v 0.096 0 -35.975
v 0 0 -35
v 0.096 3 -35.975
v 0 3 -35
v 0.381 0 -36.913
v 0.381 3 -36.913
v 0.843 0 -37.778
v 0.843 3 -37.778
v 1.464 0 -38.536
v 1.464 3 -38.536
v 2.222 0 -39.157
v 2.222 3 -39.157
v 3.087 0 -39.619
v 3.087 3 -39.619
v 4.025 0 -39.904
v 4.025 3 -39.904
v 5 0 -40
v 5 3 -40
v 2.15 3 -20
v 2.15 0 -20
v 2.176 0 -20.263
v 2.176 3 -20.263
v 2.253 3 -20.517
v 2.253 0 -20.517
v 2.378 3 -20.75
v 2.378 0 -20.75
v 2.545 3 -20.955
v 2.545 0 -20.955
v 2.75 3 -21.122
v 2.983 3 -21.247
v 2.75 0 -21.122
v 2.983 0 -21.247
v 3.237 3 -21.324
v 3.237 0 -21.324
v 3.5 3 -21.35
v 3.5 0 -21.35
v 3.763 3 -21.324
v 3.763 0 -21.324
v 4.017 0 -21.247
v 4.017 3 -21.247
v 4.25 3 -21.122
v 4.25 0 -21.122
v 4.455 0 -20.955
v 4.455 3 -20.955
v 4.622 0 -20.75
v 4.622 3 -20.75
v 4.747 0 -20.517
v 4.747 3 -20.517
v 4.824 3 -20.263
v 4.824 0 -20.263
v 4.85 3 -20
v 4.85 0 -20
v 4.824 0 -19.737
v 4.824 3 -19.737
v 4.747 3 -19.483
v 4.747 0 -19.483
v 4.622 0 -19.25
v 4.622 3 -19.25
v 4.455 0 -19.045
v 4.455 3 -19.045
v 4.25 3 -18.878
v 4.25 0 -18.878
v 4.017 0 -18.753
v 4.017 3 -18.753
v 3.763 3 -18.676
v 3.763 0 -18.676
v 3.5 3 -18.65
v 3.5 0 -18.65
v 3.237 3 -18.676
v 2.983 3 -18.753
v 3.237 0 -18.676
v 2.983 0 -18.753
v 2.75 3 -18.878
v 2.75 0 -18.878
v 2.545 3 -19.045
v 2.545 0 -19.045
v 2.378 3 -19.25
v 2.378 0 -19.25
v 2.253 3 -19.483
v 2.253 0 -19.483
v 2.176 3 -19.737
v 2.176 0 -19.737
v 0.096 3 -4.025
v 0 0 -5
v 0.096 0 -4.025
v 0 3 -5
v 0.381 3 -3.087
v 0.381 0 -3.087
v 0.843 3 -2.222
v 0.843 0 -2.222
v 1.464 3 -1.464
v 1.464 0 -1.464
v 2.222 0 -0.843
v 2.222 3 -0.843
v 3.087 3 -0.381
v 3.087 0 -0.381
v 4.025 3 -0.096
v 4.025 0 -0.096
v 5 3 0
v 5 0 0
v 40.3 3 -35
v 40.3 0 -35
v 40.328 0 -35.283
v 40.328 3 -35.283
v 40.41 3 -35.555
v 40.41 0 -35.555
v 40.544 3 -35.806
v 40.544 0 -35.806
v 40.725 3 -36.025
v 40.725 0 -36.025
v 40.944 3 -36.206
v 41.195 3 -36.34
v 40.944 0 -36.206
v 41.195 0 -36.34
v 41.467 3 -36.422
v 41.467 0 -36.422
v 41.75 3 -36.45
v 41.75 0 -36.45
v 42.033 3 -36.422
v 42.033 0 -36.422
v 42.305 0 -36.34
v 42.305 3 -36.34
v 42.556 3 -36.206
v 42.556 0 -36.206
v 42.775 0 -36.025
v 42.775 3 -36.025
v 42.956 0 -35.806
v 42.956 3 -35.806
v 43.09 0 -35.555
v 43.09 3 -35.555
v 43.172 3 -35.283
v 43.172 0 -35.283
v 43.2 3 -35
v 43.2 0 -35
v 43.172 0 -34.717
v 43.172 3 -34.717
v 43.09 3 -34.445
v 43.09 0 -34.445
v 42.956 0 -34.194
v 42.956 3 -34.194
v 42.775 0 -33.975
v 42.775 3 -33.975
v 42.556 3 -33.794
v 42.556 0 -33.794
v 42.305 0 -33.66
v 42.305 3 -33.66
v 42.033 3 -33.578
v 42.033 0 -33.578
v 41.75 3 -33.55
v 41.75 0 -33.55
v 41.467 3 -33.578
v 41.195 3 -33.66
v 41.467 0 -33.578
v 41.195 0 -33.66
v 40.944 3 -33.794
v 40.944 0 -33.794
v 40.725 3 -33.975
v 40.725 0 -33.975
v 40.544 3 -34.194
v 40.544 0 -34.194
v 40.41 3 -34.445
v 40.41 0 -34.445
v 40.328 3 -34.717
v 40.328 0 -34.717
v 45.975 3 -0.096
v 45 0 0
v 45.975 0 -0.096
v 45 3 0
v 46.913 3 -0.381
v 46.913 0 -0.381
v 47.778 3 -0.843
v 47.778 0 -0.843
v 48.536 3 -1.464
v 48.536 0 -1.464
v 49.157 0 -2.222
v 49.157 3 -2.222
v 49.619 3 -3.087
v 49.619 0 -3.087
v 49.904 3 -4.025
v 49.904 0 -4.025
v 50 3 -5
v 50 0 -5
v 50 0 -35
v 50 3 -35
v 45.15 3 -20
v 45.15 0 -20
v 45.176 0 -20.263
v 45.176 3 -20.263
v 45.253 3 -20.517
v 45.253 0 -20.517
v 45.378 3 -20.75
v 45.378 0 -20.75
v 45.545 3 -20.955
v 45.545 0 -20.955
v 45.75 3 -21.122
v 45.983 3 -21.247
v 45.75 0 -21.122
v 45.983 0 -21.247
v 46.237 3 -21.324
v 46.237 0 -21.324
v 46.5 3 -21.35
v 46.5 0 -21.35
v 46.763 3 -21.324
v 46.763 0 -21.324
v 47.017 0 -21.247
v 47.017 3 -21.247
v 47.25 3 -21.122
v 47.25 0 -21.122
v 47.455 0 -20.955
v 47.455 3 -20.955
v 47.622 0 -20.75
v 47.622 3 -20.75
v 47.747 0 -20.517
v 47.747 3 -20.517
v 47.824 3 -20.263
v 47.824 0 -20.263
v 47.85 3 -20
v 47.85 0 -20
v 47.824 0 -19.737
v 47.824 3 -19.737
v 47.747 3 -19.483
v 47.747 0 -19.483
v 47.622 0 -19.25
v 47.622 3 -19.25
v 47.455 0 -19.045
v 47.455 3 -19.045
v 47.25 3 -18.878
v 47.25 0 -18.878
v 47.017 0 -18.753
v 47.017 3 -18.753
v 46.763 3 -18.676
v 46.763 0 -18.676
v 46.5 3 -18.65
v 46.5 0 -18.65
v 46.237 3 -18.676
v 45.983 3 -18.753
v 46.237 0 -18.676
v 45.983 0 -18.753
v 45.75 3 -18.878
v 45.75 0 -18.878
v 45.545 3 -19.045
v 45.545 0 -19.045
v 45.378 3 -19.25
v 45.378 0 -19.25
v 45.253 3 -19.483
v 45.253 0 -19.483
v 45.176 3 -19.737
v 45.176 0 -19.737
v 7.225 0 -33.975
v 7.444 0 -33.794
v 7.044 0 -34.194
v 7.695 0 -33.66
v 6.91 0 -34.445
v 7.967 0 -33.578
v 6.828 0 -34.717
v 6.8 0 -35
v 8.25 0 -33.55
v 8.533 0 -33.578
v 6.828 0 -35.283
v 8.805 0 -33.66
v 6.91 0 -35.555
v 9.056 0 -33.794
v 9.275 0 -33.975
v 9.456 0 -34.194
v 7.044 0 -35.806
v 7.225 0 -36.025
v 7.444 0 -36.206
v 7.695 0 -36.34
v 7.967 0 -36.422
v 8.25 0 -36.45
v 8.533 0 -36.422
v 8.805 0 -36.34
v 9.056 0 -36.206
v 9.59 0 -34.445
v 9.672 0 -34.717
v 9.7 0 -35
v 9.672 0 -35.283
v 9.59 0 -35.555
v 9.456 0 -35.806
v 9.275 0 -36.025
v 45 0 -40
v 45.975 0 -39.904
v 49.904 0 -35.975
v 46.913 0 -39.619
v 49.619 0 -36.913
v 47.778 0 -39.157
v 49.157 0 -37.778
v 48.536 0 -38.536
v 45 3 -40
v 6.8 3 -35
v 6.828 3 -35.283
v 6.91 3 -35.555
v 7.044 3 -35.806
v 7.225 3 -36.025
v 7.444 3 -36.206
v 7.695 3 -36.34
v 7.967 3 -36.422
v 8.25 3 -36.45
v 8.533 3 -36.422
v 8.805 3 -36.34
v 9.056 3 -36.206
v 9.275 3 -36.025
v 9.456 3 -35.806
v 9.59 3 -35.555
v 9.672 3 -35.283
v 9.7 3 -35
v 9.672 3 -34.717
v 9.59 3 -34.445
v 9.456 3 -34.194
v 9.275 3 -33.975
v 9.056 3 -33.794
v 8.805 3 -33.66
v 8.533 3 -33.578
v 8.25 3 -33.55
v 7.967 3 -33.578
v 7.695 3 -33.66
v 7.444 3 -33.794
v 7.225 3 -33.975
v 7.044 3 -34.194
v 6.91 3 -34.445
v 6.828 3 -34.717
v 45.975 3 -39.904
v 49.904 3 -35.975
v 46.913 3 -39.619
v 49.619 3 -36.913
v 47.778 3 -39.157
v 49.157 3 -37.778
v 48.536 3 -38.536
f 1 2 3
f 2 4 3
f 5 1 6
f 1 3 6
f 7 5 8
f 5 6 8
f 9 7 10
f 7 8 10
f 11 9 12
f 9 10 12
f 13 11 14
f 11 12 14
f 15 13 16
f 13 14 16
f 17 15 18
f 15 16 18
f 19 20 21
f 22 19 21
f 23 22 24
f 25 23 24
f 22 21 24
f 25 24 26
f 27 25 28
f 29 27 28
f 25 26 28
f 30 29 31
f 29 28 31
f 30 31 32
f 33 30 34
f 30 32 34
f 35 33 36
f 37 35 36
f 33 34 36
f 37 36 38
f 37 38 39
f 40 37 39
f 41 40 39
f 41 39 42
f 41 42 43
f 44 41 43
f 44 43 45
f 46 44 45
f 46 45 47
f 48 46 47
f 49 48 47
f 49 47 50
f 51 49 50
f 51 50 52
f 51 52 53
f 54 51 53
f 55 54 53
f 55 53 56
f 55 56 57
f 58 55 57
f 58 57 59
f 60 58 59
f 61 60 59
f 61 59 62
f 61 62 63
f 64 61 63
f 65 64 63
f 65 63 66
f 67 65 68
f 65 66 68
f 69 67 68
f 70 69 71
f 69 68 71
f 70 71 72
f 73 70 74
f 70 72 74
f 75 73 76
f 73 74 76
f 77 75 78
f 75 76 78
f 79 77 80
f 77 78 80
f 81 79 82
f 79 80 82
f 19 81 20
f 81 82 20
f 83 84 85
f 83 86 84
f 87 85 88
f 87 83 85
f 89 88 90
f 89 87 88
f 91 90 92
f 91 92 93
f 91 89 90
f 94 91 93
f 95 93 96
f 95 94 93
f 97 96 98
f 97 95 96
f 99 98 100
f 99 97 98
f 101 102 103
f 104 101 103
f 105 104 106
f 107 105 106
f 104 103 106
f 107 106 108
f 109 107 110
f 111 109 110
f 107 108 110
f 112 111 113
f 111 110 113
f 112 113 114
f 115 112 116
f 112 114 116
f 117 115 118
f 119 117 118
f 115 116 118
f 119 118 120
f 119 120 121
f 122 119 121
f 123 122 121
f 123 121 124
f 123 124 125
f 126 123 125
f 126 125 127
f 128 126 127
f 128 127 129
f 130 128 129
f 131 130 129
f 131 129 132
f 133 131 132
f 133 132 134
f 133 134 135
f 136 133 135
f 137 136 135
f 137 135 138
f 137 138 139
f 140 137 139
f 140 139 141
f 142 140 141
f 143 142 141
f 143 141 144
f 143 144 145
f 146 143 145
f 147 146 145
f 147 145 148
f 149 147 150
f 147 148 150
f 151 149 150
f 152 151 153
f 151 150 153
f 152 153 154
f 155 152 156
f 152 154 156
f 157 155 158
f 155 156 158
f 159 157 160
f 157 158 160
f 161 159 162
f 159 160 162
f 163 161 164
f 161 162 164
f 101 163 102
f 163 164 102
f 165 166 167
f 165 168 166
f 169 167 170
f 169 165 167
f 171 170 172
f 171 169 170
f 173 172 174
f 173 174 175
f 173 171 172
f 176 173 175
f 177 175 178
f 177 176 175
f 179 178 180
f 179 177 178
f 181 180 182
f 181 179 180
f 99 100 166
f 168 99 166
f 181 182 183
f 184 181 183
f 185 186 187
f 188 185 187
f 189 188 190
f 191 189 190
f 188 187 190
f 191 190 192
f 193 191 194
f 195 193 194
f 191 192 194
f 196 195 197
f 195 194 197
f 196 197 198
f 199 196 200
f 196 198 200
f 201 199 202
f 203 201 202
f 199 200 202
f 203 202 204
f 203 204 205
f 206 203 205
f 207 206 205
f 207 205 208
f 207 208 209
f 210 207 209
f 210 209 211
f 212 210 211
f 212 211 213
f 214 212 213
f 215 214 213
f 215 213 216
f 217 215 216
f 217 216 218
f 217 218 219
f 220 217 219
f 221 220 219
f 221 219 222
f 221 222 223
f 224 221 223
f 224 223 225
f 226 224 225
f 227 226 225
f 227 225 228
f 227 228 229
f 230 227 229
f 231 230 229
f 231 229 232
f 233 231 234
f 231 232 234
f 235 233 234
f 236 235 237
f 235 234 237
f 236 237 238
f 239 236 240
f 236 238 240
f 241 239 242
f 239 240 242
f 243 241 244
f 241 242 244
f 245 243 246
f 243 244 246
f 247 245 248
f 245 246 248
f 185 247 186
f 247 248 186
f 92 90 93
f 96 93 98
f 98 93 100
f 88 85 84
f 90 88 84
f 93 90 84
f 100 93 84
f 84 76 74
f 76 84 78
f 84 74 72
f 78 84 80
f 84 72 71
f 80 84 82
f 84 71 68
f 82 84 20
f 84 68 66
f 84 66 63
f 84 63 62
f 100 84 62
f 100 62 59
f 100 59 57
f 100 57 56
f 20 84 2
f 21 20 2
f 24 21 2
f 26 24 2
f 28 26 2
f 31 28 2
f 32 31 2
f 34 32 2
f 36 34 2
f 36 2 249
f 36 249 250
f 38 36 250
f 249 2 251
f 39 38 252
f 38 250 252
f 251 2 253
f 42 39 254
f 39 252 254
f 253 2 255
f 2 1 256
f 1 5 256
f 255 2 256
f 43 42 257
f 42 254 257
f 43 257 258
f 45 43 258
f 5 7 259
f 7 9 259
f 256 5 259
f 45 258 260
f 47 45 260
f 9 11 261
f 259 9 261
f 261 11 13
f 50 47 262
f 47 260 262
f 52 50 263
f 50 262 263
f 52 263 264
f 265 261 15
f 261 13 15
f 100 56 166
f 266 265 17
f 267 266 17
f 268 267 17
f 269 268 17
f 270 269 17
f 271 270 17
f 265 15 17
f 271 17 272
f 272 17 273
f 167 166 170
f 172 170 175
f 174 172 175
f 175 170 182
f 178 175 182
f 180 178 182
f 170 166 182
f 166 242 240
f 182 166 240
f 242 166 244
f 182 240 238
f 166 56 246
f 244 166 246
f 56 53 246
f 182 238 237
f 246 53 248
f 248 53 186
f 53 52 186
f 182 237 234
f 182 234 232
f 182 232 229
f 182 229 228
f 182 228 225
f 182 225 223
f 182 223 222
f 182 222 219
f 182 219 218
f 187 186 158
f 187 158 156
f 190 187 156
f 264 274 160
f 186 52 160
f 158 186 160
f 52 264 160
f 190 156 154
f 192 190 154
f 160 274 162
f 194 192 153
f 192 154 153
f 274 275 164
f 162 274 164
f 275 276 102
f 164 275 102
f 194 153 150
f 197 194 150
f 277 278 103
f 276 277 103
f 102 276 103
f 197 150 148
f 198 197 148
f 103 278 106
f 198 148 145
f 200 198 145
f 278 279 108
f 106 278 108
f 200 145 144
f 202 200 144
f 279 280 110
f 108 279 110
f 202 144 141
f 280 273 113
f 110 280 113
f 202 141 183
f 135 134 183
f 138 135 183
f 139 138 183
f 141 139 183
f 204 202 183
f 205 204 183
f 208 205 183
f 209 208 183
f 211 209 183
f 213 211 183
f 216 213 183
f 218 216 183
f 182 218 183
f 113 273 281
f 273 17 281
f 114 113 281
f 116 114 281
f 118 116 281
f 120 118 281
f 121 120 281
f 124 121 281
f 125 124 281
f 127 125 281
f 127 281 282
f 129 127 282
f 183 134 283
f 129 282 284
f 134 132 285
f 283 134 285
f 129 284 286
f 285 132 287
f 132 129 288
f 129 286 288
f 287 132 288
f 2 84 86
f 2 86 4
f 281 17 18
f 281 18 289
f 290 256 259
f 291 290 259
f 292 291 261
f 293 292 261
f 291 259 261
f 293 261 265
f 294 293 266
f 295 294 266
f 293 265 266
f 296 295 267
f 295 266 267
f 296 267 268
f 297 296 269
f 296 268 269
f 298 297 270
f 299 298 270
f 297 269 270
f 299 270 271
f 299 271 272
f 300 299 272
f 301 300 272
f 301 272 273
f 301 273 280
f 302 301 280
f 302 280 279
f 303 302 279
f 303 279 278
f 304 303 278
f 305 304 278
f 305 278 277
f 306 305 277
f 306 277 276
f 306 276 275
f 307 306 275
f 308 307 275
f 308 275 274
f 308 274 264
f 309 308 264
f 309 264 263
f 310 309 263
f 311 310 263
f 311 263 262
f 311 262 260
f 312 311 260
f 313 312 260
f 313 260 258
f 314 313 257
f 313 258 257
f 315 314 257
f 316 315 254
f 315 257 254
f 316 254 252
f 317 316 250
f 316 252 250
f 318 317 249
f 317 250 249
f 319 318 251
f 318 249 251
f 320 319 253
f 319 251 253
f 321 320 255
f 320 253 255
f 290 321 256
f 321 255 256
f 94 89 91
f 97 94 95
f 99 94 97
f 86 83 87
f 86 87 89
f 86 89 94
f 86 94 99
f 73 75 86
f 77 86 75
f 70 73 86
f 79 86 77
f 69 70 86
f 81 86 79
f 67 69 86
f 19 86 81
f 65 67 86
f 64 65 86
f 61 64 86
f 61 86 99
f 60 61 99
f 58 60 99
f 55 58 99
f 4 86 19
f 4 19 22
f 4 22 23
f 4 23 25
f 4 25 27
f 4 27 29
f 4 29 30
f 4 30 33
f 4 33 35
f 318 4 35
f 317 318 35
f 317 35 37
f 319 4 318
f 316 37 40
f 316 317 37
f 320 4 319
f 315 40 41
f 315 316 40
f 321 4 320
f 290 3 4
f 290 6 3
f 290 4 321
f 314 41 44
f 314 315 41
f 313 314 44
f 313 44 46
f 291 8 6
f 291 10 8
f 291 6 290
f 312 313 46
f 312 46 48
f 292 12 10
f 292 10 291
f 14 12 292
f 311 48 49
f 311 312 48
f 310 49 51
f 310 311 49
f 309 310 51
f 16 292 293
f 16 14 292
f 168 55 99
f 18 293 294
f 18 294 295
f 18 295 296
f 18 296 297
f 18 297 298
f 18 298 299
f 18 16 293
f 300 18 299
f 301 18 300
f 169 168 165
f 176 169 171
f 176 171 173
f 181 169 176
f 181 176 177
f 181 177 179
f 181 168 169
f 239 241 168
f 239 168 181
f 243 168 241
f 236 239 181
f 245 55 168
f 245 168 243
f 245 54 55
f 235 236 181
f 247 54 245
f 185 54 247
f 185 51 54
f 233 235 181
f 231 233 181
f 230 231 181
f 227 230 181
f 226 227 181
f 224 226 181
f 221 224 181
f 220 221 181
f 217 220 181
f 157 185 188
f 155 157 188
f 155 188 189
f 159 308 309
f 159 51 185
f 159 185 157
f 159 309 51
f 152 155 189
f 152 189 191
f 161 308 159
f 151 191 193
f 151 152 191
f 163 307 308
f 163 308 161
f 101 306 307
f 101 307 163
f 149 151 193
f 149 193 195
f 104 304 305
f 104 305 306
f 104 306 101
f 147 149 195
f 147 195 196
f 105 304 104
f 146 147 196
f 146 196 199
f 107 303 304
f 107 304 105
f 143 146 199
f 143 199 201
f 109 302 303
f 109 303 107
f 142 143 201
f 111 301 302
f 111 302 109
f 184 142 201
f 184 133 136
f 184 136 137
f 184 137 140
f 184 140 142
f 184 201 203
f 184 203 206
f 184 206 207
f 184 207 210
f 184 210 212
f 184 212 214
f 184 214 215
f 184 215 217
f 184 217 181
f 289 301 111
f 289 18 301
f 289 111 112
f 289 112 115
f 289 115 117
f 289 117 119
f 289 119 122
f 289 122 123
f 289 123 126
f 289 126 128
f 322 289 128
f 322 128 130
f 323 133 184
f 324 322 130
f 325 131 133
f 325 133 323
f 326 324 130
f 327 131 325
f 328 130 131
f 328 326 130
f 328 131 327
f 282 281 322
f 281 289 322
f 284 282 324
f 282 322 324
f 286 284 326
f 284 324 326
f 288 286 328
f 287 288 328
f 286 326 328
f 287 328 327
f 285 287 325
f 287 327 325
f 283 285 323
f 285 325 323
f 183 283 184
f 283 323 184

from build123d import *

# Parameters (mm, degrees)
SKETCH1_W                  = 50
SKETCH1_H                  = 40
BOSS_EXTRUDE1_DEPTH        = 3
M2_5_CLEARANCE_HOLE1_D     = 2.9
M2_5_CLEARANCE_HOLE1_DEPTH = 15.24
M2_5_CLEARANCE_HOLE1_TIP   = 0.871247898
M2_5_CLEARANCE_HOLE2_D     = 2.7
M2_5_CLEARANCE_HOLE2_DEPTH = 15.24
M2_5_CLEARANCE_HOLE2_TIP   = 0.811161836
FILLET1_R                  = 5


with BuildPart() as part:
    # Sketch1 → Boss-Extrude1 (new body)
    with BuildSketch(Plane(origin=(0, 0, 0), x_dir=(1, 0, 0), z_dir=(0, 1, 0))):
        with Locations((25, 20)):
            Rectangle(SKETCH1_W, SKETCH1_H)
    extrude(amount=BOSS_EXTRUDE1_DEPTH)

    # M2.5 Clearance Hole1
    with Locations(Plane(origin=(0, 3, 0), x_dir=(1, 0, 0), z_dir=(0, 1, 0))):
        with Locations((8.25, 35), (41.75, 35)):
            Hole(M2_5_CLEARANCE_HOLE1_D / 2, depth=M2_5_CLEARANCE_HOLE1_DEPTH)
            with Locations((0, 0, -(M2_5_CLEARANCE_HOLE1_DEPTH + M2_5_CLEARANCE_HOLE1_TIP / 2))):  # 118° drill point
                Cone(0, M2_5_CLEARANCE_HOLE1_D / 2, M2_5_CLEARANCE_HOLE1_TIP, mode=Mode.SUBTRACT)

    # M2.5 Clearance Hole2
    with Locations(Plane(origin=(0, 3, 0), x_dir=(1, 0, 0), z_dir=(0, 1, 0))):
        with Locations((3.5, 20), (46.5, 20)):
            Hole(M2_5_CLEARANCE_HOLE2_D / 2, depth=M2_5_CLEARANCE_HOLE2_DEPTH)
            with Locations((0, 0, -(M2_5_CLEARANCE_HOLE2_DEPTH + M2_5_CLEARANCE_HOLE2_TIP / 2))):  # 118° drill point
                Cone(0, M2_5_CLEARANCE_HOLE2_D / 2, M2_5_CLEARANCE_HOLE2_TIP, mode=Mode.SUBTRACT)

    # Fillet1
    fillet1_edges = [part.edges().sort_by_distance(p)[0] for p in [
        (0, 1.5, -40),
        (50, 1.5, -40),
        (50, 1.5, 0),
        (0, 1.5, 0),
    ]]
    fillet(fillet1_edges, radius=FILLET1_R)


solid = part.part
